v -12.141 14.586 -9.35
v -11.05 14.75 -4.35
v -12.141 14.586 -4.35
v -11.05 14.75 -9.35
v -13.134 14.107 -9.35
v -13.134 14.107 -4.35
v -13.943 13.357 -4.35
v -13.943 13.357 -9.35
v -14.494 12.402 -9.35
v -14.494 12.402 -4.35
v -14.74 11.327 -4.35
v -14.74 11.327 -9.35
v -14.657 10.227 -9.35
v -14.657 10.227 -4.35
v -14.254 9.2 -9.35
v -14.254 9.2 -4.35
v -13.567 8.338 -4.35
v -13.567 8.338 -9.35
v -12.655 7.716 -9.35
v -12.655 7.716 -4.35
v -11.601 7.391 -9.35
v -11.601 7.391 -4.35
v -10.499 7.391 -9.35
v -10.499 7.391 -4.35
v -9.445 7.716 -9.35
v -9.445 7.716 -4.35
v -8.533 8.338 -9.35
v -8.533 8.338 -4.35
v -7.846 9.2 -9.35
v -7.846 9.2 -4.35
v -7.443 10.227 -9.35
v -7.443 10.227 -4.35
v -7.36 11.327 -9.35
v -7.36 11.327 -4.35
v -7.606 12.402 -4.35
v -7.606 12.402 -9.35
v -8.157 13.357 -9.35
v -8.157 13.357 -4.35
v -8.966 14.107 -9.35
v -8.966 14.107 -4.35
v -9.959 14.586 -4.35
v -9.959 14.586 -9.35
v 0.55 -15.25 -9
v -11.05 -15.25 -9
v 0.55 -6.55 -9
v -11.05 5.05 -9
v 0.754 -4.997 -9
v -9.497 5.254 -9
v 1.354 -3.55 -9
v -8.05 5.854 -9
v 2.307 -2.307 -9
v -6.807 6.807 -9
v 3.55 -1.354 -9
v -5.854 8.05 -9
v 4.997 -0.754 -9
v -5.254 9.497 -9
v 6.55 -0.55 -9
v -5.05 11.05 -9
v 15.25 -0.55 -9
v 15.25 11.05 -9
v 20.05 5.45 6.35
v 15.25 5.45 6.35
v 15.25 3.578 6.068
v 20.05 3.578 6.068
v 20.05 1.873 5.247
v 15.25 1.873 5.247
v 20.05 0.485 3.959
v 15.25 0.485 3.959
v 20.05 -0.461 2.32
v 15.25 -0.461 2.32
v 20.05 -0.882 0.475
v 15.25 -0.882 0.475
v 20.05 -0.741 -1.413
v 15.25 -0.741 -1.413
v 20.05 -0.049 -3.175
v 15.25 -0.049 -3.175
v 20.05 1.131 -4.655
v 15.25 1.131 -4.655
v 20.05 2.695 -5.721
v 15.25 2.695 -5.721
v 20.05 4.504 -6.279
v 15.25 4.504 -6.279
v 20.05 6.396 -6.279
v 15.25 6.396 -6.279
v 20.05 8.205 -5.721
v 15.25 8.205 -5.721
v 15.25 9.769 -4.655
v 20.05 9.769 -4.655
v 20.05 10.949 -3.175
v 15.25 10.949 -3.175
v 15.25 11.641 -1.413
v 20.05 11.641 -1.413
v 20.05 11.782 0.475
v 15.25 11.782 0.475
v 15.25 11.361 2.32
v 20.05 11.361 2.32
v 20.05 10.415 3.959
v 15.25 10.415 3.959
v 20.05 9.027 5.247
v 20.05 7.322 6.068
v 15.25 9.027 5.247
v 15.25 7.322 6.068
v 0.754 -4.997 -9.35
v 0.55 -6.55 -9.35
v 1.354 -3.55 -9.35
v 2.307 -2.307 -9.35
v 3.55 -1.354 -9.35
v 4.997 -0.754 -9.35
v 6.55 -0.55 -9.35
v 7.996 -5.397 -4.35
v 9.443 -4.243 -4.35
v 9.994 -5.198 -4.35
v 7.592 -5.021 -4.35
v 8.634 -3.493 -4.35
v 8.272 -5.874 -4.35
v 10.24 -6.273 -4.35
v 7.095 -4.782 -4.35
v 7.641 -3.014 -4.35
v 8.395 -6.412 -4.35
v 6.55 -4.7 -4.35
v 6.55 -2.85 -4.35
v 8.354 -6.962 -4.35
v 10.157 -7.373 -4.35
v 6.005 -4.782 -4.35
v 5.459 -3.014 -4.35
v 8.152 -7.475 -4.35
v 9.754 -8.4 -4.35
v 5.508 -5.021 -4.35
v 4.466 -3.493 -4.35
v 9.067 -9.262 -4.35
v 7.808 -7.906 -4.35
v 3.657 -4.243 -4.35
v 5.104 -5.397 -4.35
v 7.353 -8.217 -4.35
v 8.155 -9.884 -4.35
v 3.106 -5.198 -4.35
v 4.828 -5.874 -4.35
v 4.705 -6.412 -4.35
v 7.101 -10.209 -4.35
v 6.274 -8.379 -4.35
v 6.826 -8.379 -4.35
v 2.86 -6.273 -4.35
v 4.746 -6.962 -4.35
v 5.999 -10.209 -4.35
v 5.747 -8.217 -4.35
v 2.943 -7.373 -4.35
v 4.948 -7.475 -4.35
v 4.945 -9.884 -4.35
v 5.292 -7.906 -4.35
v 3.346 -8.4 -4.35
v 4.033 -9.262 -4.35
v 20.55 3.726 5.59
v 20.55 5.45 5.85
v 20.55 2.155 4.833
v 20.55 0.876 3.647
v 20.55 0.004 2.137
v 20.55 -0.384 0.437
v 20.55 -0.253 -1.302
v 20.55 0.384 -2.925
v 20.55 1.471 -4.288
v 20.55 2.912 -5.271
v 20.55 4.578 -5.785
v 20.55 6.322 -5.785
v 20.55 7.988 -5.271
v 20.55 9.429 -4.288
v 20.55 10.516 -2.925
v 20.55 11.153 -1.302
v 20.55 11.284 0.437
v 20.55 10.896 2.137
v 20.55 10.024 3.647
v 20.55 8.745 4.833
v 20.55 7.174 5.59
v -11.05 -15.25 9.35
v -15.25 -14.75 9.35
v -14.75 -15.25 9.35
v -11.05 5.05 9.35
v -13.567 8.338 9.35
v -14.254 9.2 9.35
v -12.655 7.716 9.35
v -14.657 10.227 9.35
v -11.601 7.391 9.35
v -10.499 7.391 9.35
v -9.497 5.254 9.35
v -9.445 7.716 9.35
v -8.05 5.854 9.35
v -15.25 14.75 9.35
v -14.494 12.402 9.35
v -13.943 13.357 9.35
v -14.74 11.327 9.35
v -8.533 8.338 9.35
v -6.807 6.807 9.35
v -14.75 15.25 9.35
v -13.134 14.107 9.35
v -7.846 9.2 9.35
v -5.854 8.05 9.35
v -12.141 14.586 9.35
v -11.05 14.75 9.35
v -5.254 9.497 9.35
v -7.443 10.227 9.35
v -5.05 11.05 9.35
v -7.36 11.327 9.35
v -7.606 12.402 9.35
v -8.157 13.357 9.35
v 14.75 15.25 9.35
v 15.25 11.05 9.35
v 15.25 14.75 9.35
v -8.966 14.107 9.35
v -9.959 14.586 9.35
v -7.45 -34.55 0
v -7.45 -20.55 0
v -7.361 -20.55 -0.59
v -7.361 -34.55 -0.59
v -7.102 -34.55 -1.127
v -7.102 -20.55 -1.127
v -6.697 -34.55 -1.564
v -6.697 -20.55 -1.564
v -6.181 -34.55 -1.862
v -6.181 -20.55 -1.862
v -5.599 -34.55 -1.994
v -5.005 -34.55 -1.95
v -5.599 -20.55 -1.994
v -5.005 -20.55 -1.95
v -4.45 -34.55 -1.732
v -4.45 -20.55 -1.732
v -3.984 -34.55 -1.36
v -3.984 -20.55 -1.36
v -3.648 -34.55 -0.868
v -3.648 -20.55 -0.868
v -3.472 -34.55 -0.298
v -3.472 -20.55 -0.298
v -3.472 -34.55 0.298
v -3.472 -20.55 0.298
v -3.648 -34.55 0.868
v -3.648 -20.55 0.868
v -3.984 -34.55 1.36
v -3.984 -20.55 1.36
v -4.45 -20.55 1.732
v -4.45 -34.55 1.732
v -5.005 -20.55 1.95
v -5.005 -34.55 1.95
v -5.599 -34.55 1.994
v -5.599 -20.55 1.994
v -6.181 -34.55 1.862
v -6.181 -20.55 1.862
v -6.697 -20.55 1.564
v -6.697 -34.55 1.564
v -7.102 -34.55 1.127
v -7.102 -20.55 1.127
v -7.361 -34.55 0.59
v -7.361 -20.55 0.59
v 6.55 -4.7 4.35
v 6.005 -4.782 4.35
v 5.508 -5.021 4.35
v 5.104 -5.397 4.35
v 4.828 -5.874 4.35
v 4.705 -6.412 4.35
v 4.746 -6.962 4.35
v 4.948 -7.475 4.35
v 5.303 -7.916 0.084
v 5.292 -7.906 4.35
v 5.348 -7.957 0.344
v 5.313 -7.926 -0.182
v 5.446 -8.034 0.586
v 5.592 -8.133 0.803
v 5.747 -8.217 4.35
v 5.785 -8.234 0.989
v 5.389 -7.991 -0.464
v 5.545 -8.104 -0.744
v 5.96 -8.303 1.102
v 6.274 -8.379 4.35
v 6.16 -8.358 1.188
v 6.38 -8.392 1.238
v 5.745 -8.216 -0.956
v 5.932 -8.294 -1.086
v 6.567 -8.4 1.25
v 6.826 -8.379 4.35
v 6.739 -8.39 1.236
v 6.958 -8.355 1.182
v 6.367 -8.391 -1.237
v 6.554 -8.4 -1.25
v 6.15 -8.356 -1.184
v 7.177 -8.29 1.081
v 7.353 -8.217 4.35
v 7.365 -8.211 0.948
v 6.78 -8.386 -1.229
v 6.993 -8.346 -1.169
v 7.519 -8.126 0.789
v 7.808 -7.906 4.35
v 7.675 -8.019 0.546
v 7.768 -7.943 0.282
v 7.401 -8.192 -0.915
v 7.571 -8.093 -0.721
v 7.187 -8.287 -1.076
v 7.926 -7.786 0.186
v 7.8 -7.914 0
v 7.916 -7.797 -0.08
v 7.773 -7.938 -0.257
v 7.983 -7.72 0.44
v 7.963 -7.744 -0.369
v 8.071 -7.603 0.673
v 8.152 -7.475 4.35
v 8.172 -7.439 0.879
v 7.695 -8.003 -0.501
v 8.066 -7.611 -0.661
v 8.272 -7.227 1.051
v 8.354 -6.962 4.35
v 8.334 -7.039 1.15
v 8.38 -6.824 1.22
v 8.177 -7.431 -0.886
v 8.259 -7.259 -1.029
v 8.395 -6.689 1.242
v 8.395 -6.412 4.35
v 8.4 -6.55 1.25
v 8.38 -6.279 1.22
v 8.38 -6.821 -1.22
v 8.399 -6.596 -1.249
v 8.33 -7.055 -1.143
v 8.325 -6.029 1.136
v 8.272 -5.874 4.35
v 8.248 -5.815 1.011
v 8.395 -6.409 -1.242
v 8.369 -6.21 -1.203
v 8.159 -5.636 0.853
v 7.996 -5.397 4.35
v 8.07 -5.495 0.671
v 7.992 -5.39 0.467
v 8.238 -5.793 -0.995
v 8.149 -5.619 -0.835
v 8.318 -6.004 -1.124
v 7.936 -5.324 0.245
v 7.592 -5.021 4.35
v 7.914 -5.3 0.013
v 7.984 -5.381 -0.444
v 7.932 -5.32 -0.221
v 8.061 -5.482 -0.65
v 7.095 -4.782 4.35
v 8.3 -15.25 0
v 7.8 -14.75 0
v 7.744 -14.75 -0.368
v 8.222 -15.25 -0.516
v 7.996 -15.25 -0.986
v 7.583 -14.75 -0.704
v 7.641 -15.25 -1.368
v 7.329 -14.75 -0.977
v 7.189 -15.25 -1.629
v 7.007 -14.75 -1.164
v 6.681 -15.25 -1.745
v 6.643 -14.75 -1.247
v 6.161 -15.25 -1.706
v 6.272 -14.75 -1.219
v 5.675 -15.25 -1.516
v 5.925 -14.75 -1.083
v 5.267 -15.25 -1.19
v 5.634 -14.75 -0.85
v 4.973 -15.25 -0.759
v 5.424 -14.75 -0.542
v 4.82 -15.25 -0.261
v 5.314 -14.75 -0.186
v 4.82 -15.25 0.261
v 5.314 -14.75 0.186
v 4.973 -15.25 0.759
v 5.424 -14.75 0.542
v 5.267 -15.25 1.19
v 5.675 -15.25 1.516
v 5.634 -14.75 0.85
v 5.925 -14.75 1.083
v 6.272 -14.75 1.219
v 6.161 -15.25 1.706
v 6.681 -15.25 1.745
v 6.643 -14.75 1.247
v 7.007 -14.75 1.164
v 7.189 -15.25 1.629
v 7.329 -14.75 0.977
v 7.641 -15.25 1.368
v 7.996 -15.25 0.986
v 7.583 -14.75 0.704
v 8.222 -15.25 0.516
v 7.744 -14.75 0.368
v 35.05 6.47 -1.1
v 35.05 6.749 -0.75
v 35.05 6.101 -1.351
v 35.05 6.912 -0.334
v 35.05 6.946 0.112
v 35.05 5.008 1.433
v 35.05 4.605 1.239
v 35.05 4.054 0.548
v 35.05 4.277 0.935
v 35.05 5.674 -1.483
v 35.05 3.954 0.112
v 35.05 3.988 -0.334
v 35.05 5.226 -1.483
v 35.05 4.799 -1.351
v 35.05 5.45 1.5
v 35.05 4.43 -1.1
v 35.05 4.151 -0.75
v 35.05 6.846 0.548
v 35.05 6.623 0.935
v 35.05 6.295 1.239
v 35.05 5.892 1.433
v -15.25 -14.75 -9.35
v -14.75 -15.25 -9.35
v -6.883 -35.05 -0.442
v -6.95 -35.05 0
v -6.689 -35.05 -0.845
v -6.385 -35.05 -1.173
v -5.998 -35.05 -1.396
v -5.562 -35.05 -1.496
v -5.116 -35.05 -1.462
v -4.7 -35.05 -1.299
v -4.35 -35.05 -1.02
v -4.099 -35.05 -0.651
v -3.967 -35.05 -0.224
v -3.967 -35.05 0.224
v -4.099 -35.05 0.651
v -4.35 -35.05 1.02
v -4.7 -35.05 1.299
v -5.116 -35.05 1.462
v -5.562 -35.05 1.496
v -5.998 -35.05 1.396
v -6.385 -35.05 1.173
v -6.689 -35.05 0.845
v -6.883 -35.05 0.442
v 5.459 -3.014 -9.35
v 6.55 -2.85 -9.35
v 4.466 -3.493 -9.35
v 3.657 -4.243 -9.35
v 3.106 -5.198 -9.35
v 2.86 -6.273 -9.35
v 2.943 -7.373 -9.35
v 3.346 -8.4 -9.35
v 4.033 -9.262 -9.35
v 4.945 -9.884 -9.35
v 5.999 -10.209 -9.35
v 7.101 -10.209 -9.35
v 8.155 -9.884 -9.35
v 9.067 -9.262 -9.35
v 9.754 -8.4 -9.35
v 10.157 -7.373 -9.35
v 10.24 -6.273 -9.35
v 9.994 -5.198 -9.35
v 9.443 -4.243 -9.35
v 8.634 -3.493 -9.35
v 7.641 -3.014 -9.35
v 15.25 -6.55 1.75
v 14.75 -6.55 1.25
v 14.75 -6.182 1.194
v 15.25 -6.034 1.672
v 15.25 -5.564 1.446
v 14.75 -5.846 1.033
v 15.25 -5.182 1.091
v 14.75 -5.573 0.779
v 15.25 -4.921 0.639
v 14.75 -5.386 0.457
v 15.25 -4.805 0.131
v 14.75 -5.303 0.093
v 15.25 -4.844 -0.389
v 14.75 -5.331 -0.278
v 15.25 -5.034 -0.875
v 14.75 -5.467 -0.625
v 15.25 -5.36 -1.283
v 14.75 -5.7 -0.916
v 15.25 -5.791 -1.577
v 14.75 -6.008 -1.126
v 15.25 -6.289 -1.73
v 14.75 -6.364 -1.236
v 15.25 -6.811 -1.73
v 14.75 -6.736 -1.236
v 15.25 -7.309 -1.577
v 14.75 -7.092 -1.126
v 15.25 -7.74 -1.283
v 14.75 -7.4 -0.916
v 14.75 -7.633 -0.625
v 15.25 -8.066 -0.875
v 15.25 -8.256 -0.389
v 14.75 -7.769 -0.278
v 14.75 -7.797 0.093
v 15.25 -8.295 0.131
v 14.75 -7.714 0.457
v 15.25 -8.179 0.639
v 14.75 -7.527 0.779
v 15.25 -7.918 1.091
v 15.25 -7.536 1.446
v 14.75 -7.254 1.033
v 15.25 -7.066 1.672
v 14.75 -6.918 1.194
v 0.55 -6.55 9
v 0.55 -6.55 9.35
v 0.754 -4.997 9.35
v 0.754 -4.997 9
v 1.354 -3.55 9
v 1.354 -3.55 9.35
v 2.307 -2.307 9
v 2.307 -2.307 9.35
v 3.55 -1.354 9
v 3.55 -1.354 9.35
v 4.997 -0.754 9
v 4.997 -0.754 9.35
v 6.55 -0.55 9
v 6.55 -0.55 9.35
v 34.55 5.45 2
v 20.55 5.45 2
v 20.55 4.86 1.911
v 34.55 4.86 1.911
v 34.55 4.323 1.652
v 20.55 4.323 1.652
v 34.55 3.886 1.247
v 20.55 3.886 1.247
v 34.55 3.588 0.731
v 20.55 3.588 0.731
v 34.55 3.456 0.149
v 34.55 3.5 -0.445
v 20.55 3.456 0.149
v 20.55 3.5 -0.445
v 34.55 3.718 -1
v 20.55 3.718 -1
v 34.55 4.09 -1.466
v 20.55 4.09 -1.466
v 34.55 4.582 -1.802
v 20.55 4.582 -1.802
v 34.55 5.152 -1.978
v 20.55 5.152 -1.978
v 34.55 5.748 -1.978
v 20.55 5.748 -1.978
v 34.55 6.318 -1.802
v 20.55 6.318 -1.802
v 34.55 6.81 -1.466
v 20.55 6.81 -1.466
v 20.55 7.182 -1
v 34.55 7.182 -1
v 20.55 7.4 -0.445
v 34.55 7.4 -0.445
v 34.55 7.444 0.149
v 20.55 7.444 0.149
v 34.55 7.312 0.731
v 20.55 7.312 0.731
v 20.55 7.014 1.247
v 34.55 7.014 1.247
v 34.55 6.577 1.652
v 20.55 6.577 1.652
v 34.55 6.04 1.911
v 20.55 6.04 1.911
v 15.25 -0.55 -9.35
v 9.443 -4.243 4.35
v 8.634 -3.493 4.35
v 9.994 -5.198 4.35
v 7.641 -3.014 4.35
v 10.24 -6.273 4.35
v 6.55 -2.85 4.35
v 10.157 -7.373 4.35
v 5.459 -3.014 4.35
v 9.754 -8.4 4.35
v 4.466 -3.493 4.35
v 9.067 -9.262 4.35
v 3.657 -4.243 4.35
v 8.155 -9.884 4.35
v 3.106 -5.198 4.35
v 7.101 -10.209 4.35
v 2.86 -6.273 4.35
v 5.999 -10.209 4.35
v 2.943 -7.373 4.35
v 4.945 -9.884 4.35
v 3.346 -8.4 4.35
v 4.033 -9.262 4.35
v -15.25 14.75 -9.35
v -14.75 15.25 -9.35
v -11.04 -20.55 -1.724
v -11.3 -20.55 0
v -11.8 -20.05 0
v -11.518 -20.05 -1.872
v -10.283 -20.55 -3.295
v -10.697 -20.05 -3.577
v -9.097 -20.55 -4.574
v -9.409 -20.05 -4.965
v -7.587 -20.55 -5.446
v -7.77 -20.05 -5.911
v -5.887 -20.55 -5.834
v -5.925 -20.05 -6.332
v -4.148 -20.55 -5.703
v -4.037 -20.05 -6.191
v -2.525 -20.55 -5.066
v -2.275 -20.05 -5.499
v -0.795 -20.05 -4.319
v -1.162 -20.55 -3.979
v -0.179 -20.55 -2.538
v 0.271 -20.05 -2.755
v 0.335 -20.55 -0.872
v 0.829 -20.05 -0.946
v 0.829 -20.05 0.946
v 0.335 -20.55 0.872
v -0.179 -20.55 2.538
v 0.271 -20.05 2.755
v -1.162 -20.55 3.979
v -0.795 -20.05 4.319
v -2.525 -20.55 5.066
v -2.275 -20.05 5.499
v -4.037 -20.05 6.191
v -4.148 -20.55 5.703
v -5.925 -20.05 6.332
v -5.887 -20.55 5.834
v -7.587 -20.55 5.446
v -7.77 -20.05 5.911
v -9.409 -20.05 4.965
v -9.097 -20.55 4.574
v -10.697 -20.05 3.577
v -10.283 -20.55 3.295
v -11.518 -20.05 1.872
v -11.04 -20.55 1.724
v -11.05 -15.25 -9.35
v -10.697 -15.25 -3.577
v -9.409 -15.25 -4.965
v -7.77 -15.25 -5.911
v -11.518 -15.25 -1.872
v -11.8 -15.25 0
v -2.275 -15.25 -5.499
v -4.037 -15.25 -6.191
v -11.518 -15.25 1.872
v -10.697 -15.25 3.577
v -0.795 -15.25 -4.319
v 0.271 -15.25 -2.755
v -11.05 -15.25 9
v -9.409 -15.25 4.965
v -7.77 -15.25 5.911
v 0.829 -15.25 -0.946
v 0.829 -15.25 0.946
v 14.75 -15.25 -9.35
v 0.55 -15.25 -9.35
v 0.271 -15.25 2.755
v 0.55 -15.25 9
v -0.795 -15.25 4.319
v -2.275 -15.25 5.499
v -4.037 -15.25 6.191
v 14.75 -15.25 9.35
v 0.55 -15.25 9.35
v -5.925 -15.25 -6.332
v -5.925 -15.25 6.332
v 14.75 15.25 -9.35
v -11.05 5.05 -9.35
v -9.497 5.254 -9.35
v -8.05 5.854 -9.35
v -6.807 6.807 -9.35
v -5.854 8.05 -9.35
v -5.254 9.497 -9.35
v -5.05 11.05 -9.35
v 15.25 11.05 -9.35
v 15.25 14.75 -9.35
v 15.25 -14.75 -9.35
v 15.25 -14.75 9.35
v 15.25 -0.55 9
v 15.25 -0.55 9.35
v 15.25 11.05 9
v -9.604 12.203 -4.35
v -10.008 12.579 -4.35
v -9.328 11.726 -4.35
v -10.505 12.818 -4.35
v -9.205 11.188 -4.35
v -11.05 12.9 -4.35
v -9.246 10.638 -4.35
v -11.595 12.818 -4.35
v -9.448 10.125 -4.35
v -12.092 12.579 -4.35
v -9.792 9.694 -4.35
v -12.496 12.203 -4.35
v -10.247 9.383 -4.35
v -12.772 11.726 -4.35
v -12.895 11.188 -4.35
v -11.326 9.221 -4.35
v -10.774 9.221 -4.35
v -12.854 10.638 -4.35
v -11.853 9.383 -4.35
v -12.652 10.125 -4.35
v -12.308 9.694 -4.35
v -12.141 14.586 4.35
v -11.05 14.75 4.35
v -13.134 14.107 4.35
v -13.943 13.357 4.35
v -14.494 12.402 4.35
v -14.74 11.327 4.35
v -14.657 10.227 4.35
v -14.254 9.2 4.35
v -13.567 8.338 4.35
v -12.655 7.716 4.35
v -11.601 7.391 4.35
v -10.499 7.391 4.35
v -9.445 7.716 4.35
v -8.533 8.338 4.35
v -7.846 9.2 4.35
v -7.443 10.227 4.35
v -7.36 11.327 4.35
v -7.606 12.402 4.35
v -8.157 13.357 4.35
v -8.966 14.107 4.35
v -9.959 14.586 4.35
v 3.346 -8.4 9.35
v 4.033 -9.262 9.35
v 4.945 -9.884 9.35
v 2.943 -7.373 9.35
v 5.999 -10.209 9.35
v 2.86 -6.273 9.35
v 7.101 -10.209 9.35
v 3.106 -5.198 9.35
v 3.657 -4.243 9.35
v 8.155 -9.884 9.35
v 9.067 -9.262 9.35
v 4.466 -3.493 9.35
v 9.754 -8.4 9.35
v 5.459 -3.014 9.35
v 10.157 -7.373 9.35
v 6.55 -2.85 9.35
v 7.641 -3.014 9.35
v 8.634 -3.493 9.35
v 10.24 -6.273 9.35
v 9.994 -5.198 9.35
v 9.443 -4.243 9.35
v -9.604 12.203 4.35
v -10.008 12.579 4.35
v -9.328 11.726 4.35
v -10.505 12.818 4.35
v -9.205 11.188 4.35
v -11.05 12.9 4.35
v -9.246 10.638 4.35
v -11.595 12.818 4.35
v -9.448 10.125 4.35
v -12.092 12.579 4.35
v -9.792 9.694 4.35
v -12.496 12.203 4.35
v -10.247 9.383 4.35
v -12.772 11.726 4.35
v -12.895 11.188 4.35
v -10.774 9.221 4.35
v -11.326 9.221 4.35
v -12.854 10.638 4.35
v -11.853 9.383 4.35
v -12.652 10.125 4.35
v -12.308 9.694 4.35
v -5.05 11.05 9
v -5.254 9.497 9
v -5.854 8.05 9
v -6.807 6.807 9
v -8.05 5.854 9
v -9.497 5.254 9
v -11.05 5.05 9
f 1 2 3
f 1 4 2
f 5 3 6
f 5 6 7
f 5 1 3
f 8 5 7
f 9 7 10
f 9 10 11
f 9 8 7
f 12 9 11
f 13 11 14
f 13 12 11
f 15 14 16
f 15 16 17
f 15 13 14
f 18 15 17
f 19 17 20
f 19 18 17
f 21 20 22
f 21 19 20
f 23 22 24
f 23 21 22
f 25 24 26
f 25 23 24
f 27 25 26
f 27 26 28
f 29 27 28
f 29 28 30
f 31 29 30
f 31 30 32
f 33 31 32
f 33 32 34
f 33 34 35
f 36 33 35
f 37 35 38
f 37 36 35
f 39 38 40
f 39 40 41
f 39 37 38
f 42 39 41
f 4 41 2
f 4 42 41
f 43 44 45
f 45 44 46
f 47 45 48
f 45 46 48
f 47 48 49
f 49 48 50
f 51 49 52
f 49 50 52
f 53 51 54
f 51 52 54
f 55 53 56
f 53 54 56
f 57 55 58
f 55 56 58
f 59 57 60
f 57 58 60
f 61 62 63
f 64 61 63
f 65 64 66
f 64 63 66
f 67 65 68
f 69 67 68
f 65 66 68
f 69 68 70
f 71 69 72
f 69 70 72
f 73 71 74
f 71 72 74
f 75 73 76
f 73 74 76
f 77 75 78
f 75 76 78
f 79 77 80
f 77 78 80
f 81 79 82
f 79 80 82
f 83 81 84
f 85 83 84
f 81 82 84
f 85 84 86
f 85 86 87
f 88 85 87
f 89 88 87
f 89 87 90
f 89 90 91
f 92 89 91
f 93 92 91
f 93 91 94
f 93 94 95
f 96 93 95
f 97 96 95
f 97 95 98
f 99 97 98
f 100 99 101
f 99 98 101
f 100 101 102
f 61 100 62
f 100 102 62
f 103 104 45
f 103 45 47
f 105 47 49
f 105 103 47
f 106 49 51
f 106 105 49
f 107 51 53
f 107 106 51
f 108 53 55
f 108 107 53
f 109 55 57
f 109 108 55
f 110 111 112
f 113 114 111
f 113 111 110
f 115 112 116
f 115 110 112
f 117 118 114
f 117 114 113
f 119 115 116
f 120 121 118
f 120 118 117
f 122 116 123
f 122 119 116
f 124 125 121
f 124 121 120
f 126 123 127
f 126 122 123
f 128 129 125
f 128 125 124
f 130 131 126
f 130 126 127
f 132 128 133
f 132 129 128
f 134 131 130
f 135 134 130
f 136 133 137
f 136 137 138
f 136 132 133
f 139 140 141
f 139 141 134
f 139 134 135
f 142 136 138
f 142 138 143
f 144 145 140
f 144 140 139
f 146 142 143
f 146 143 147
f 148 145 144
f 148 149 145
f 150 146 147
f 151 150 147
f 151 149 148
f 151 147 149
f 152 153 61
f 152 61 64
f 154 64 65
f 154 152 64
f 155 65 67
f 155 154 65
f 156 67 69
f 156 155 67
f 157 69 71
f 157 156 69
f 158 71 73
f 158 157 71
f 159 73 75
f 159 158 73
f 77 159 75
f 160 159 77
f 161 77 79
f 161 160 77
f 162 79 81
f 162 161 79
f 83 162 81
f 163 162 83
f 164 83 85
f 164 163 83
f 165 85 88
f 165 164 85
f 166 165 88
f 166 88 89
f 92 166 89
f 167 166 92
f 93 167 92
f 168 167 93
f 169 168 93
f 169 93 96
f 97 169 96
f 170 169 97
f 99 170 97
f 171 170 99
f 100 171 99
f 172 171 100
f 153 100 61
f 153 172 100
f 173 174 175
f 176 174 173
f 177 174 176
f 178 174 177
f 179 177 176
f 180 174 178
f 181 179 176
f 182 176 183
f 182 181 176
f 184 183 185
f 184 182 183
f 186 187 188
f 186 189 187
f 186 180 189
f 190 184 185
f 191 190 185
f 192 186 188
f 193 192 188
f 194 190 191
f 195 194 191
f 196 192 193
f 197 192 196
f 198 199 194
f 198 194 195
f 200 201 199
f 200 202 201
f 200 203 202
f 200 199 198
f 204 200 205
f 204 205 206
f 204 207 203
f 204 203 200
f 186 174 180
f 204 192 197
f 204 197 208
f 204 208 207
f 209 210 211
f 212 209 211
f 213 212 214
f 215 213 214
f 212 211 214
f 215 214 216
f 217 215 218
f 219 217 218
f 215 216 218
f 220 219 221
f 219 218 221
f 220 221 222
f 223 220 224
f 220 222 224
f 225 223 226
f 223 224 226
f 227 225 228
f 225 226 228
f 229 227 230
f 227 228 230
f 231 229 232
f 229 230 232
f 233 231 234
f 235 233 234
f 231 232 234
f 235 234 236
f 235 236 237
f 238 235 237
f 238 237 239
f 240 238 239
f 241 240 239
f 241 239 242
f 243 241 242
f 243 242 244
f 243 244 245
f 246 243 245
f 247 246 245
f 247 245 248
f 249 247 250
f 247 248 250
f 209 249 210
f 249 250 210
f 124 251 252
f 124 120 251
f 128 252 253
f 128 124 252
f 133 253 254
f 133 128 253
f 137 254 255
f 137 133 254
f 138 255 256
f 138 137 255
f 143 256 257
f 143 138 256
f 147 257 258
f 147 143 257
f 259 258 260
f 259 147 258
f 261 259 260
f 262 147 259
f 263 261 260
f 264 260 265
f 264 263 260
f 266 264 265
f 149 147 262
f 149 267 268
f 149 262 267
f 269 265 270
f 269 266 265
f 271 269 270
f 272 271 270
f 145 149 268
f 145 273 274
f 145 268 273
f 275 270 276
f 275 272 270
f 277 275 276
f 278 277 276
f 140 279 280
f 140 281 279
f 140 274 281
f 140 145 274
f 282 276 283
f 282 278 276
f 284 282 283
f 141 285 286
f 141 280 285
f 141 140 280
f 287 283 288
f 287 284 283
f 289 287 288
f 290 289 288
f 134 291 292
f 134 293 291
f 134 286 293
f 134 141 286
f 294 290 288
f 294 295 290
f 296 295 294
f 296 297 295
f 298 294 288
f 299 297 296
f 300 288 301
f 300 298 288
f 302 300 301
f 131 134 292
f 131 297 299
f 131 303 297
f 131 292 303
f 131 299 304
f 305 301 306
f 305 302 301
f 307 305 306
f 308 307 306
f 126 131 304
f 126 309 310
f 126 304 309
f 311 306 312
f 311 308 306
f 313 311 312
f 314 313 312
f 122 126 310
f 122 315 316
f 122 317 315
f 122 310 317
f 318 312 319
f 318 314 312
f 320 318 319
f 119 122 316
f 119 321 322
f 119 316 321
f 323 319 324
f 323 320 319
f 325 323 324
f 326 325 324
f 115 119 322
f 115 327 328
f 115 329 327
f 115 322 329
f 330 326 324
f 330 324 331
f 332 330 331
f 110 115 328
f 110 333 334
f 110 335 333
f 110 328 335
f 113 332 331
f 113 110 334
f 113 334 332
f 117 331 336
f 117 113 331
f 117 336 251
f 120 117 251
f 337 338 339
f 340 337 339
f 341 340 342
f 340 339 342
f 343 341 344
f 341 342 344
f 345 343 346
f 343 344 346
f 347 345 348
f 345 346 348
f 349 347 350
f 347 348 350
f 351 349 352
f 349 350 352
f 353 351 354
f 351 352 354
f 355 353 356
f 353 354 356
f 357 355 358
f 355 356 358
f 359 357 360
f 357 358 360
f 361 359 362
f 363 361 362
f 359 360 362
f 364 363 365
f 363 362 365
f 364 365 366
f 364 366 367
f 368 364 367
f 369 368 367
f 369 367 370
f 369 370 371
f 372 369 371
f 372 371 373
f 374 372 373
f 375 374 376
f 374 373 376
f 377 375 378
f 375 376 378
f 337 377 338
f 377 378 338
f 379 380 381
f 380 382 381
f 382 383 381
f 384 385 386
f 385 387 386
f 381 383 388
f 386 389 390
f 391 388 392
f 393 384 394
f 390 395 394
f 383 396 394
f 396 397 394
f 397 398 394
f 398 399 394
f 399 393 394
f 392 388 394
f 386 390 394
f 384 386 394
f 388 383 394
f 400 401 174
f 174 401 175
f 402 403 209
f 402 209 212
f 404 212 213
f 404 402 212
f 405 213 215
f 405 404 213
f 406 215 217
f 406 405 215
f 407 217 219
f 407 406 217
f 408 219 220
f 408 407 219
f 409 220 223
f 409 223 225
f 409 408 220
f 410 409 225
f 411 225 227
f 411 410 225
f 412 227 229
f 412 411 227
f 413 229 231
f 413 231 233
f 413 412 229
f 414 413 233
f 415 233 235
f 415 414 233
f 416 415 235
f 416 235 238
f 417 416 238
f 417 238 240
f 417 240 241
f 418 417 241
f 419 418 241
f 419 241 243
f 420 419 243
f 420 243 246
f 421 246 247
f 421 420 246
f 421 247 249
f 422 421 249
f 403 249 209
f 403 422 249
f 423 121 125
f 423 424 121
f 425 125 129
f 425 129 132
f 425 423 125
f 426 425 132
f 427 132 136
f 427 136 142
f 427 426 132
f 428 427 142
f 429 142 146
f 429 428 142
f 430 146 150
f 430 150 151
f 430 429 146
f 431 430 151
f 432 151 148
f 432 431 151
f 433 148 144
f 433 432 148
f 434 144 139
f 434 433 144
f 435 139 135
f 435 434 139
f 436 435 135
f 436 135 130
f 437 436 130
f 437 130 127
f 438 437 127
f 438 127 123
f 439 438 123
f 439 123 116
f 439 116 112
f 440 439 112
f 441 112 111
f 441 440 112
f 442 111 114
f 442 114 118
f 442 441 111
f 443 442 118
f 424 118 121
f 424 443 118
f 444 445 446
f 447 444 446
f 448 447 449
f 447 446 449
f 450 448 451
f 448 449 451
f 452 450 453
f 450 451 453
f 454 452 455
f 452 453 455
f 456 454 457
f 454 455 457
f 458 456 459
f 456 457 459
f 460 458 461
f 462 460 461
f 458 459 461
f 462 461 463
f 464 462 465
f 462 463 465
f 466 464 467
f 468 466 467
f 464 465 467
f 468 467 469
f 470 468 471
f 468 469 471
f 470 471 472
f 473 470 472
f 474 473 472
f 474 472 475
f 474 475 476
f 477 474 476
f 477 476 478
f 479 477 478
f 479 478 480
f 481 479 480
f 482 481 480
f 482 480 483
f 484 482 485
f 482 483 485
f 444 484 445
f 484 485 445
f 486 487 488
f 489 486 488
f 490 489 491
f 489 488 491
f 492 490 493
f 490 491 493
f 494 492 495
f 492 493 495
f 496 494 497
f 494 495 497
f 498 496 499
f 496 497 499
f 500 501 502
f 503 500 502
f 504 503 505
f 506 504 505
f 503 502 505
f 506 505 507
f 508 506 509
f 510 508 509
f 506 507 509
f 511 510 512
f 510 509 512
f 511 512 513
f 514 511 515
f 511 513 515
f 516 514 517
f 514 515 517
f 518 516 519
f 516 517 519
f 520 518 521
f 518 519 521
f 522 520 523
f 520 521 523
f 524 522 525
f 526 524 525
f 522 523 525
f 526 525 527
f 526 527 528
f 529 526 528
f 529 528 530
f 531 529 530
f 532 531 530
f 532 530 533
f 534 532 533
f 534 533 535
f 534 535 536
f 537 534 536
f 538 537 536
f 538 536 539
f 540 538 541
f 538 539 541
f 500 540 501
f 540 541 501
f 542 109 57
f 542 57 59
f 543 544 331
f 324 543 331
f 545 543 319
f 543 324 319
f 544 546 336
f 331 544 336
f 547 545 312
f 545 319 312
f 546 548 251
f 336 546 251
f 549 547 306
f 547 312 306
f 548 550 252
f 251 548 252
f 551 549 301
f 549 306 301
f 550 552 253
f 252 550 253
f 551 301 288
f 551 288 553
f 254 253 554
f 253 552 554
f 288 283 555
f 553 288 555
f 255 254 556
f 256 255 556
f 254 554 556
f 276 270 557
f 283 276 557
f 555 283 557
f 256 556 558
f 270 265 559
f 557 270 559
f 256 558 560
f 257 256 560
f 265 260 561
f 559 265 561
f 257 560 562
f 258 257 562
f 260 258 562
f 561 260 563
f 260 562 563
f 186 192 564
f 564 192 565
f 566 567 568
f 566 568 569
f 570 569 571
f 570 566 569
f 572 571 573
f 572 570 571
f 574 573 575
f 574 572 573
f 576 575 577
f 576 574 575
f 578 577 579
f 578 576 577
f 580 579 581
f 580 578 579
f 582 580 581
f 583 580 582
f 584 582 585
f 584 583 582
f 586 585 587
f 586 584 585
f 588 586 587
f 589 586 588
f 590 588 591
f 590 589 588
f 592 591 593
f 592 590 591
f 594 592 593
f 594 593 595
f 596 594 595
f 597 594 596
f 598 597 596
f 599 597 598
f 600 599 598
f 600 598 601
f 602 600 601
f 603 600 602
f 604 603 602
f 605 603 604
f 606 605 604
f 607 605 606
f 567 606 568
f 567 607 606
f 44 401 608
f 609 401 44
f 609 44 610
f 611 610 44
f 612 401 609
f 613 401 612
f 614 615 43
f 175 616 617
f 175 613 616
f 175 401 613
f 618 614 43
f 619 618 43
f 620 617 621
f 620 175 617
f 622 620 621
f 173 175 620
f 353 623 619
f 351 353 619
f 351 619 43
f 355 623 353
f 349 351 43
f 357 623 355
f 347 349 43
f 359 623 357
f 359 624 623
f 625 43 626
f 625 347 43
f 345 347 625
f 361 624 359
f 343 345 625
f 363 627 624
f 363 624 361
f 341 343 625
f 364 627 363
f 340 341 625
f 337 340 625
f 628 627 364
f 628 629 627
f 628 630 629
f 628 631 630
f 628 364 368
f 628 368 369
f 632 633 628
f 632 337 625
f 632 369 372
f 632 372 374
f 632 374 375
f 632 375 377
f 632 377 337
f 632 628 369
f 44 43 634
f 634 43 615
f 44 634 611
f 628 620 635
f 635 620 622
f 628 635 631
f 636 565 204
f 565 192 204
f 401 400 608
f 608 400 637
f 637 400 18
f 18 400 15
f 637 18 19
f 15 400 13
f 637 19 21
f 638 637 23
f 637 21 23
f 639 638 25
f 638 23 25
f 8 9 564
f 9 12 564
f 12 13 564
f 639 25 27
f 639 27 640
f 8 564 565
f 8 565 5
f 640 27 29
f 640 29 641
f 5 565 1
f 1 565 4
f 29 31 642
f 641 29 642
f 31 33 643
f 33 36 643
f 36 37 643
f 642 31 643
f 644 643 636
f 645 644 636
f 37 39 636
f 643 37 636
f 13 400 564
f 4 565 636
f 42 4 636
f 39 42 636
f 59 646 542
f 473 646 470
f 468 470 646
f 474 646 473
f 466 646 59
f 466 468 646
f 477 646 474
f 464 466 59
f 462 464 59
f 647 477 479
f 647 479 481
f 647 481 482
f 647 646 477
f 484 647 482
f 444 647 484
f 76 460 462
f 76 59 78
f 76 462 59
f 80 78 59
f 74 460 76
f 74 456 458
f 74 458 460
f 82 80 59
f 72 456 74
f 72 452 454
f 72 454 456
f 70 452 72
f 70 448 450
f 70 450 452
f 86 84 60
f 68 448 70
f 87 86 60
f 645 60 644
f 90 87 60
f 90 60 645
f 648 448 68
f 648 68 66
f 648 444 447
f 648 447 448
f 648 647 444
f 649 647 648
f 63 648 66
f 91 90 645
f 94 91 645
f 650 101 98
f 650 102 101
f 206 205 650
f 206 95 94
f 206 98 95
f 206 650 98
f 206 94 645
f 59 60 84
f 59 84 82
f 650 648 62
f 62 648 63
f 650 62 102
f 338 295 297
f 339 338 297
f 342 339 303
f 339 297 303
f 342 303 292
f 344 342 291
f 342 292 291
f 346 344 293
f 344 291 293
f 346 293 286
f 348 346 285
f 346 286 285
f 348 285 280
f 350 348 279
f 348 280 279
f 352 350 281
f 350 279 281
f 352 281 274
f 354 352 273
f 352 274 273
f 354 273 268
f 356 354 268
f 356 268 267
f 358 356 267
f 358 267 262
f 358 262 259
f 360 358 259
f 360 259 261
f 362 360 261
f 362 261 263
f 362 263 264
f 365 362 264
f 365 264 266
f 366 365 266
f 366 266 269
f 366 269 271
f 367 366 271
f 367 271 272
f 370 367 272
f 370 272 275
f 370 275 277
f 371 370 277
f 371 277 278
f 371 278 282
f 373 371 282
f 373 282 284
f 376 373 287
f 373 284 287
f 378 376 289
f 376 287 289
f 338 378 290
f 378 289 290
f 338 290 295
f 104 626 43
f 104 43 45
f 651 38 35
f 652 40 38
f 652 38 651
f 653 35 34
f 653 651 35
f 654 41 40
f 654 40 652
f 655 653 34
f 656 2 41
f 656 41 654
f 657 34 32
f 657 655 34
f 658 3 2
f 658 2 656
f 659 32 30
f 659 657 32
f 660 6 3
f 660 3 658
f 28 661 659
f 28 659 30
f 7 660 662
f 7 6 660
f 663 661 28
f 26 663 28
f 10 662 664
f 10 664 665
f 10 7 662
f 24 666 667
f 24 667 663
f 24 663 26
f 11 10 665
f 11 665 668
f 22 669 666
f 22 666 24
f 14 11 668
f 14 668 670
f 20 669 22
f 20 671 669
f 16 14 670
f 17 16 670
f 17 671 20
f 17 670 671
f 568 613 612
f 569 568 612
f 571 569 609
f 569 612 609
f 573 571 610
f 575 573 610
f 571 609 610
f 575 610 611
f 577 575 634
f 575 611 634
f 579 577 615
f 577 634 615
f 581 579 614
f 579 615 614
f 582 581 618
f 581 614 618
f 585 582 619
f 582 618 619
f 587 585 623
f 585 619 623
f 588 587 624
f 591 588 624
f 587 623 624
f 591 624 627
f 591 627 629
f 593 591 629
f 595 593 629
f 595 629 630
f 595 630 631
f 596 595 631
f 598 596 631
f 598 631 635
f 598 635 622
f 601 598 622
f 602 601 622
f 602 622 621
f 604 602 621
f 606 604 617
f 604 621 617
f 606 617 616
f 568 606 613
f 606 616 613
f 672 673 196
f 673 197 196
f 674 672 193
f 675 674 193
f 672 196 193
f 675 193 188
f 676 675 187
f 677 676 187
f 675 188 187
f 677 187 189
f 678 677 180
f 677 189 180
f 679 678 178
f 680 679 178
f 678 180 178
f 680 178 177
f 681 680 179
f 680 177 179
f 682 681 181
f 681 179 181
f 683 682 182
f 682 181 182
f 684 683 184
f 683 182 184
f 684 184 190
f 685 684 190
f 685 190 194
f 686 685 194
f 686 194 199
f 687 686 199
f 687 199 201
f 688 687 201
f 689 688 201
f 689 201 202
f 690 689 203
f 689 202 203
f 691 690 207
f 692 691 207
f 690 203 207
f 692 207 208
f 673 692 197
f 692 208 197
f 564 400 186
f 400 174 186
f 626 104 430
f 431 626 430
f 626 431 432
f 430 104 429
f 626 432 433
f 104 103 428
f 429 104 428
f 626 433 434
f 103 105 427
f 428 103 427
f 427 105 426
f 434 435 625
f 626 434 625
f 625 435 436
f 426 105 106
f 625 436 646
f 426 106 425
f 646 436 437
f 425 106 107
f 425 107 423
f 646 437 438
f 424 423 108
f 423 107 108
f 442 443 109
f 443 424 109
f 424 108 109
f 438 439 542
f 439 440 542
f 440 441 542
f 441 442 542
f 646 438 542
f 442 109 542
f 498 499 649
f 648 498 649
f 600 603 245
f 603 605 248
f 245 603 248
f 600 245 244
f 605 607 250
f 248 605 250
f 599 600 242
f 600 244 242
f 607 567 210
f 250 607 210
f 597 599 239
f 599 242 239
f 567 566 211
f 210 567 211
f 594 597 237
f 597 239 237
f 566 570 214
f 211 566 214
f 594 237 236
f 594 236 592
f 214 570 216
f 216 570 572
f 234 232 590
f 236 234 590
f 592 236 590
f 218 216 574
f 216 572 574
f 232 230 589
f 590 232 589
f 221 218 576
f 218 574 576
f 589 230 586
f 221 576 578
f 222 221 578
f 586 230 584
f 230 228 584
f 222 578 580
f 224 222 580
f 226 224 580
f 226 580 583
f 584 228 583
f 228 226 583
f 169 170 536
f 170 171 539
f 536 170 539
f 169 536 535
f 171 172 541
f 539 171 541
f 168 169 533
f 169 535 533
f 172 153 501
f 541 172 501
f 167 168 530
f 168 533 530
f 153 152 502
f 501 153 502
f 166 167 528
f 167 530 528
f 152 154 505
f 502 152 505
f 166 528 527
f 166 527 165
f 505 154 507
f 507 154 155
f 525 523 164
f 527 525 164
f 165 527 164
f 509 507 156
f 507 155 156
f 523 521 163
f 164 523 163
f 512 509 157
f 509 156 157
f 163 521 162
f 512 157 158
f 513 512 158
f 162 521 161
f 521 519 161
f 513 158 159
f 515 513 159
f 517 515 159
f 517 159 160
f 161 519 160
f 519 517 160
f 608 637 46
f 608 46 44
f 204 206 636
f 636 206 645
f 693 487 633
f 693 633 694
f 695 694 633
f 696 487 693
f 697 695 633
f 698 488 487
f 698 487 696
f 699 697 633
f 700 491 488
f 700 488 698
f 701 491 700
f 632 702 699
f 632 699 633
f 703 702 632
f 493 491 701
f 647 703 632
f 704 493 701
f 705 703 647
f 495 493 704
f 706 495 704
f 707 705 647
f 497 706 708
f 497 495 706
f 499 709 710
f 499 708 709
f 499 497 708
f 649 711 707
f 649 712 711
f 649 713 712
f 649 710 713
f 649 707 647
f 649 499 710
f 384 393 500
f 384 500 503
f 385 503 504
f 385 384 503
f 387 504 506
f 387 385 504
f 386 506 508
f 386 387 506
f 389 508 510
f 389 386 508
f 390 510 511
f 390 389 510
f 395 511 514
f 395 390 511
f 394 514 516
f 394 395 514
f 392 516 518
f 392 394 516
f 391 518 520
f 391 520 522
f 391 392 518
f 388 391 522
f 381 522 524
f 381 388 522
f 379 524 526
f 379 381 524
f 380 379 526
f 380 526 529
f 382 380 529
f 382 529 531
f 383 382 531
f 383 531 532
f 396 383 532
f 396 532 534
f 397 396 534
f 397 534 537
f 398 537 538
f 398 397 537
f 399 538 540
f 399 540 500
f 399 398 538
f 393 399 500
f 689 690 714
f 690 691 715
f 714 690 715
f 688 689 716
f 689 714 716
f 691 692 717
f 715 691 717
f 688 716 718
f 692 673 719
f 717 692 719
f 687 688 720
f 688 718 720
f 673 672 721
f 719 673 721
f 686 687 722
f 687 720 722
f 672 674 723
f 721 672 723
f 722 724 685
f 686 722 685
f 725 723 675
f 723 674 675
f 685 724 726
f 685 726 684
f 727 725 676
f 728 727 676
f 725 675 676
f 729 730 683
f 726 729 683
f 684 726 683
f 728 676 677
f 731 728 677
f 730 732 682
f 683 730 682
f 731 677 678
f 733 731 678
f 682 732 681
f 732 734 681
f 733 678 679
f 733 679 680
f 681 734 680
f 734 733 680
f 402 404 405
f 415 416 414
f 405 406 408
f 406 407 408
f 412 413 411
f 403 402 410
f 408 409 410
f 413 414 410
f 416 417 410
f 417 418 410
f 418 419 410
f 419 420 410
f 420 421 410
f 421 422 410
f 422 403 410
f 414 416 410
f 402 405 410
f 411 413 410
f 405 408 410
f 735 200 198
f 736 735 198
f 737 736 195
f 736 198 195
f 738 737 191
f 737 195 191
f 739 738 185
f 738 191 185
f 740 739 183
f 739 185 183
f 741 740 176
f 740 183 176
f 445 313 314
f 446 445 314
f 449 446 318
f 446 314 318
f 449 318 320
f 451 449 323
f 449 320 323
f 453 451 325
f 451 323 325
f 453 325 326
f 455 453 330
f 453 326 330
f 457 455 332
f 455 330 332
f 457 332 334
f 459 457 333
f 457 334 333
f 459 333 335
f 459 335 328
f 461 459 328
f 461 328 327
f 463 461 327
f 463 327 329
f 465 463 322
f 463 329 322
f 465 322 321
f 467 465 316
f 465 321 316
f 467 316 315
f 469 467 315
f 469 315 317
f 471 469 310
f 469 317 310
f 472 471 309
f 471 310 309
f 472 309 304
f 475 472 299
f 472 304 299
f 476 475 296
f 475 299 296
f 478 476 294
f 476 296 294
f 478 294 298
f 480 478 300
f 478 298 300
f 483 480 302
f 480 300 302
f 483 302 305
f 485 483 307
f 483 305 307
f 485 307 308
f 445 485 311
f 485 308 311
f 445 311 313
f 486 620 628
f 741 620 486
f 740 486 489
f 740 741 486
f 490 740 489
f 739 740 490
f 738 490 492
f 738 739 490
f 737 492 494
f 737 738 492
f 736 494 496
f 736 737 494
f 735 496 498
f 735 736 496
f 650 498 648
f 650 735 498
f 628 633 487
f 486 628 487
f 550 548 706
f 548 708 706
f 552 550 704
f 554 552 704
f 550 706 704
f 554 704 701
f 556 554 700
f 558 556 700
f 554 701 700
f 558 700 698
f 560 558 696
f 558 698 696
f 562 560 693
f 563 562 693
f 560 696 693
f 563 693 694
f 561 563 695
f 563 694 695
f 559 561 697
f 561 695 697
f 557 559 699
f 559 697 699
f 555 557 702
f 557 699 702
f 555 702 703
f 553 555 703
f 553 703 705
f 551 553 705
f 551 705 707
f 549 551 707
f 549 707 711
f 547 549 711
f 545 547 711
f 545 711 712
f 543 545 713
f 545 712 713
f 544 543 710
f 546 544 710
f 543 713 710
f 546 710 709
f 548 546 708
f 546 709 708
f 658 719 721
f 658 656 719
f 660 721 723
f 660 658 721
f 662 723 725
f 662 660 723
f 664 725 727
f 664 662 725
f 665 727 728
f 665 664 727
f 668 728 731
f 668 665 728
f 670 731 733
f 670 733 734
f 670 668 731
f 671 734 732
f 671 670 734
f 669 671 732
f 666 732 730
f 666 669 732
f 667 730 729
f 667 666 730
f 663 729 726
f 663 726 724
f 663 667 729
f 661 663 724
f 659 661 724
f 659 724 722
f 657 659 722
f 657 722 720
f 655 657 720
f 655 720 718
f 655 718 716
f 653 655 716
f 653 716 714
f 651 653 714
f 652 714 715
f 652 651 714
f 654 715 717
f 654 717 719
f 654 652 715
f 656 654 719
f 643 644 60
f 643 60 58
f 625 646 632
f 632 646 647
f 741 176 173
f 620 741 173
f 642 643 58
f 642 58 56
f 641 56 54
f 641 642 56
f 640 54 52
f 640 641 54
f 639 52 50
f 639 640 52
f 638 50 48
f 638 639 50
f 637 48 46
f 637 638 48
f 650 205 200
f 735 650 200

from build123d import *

# Parameters (mm, degrees)
ESQUISSE1_W             = 30.5
ESQUISSE1_H             = 30.5
BOSS_EXTRU_1_DEPTH      = 9.35
TROU_TARAUD_M31_D       = 2.5
TROU_TARAUD_M31_DEPTH   = 8.5
TROU_TARAUD_M31_TIP     = 0.751075774
TROU_TARAUD_M32_D       = 2.5
TROU_TARAUD_M32_DEPTH   = 8.5
TROU_TARAUD_M32_TIP     = 0.751075774
PER_AGE1_AT_2_COUNT     = 2
PER_AGE1_AT_2_PITCH     = 24.890158698
ENL_V_MAT_EXTRU_3_DEPTH = 0.35
CHANFREIN1_SIZE         = 0.5


with BuildPart() as part:
    # Esquisse1 → Boss.-Extru.1 (new, symmetric)
    with BuildSketch(Plane.XY):
        Rectangle(ESQUISSE1_W, ESQUISSE1_H)
    extrude(amount=BOSS_EXTRU_1_DEPTH, both=True)

    # Esquisse2 → Révolution1 (revolve)
    with BuildSketch(Plane.XY, mode=Mode.PRIVATE) as r_volution1_sk:
        Polygon((35.05, 5.45), (35.05, 7.45), (20.55, 7.45), (20.55, 11.8), (15.25, 11.8), (15.25, 5.45), align=None)
    revolve(r_volution1_sk.sketch.rotate(Axis((15.25, 5.45, 0), (1, 0, 0)), 90), axis=Axis((15.25, 5.45, 0), (1, 0, 0)))

    # Esquisse3 → Révolution2 (revolve)
    with BuildSketch(Plane.XY):
        Polygon((-5.45, -35.05), (-7.45, -35.05), (-7.45, -20.55), (-11.8, -20.55), (-11.8, -15.25), (-5.45, -15.25), align=None)
    revolve(axis=Axis((-5.45, -15.25, 0), (0, -1, 0)))

    # Trou taraudé M31
    with Locations(Plane(origin=(15.25, 0, 0), x_dir=(0, 0, -1), z_dir=(1, 0, 0))):
        with Locations((0, -6.55)):
            Hole(TROU_TARAUD_M31_D / 2, depth=TROU_TARAUD_M31_DEPTH)
            with Locations((0, 0, -(TROU_TARAUD_M31_DEPTH + TROU_TARAUD_M31_TIP / 2))):  # 118° drill point
                Cone(0, TROU_TARAUD_M31_D / 2, TROU_TARAUD_M31_TIP, mode=Mode.SUBTRACT)

    # Trou taraudé M32
    with Locations(Plane(origin=(0, -15.25, 0), x_dir=(-1, 0, 0), z_dir=(0, -1, 0))):
        with Locations((-6.55, 0)):
            Hole(TROU_TARAUD_M32_D / 2, depth=TROU_TARAUD_M32_DEPTH)
            with Locations((0, 0, -(TROU_TARAUD_M32_DEPTH + TROU_TARAUD_M32_TIP / 2))):  # 118° drill point
                Cone(0, TROU_TARAUD_M32_D / 2, TROU_TARAUD_M32_TIP, mode=Mode.SUBTRACT)

    # Esquisse8 → Perçage1 (revolve, cut)
    with BuildSketch(Plane(origin=(-11.05, 11.05, -9.35), x_dir=(0, 1, 0), z_dir=(1, 0, 0))):
        Polygon((0, 0), (0, 19.811592145), (1.85, 18.7), (1.85, 5), (3.7, 5), (3.7, 0), align=None)
    per_age1 = revolve(axis=Axis((-11.05, 11.05, -20.660875039), (0, 0, 1)), mode=Mode.SUBTRACT)

    # Perçage1 at 2: Perçage1 ×2
    with Locations(*[Vector(0.7071067811865476, -0.7071067811865476, 0) * (i * PER_AGE1_AT_2_PITCH) for i in range(1, PER_AGE1_AT_2_COUNT)]):
        add(per_age1, mode=Mode.SUBTRACT)

    # Esquisse10 → Enlèv. mat.-Extru.3 (cut)
    with BuildSketch(Plane.XY.offset(-9.35)):
        with BuildLine():
            Line((15.25, 11.05), (-5.05, 11.05))
            ThreePointArc((-5.05, 11.05), (-6.807359313, 6.807359313), (-11.05, 5.05))
            Line((-11.05, 5.05), (-11.05, -15.25))
            Line((-11.05, -15.25), (0.55, -15.25))
            Line((0.55, -15.25), (0.55, -6.55))
            ThreePointArc((0.55, -6.55), (2.307359313, -2.307359313), (6.55, -0.55))
            Line((6.55, -0.55), (15.25, -0.55))
            Line((15.25, -0.55), (15.25, 11.05))
        make_face()
    enl_v_mat_extru_3 = extrude(amount=ENL_V_MAT_EXTRU_3_DEPTH, mode=Mode.SUBTRACT)

    # Symétrie1: Perçage1, Enlèv. mat.-Extru.3 across plane
    add(per_age1.mirror(Plane.XY), mode=Mode.SUBTRACT)
    add(enl_v_mat_extru_3.mirror(Plane.XY), mode=Mode.SUBTRACT)

    # Symétrie1 copy 1 sketch → Symétrie1 copy 1 (revolve, cut)
    with BuildSketch(Plane(origin=(6.55, -6.55, 9.35), x_dir=(0, 1, 0), z_dir=(1, 0, 0))):
        Polygon((0, 0), (0, -19.811592145), (1.85, -18.7), (1.85, -5), (3.7, -5), (3.7, 0), align=None)
    revolve(axis=Axis((6.55, -6.55, 20.660875039), (0, 0, 1)), mode=Mode.SUBTRACT)

    # Chanfrein1
    chanfrein1_edges = [part.edges().sort_by_distance(p)[0] for p in [
        (35.05, 5.45, -2),
        (20.55, 5.45, -6.35),
        (-3.45, -35.05, 0),
        (0.9, -20.55, 0),
        (15.25, -6.55, -1.25),
        (5.3, -15.25, 0),
        (15.25, -15.25, 0),
        (-15.25, -15.25, 0),
        (-15.25, 15.25, 0),
        (15.25, 15.25, 0),
    ]]
    chamfer(chanfrein1_edges, length=CHANFREIN1_SIZE)


solid = part.part
